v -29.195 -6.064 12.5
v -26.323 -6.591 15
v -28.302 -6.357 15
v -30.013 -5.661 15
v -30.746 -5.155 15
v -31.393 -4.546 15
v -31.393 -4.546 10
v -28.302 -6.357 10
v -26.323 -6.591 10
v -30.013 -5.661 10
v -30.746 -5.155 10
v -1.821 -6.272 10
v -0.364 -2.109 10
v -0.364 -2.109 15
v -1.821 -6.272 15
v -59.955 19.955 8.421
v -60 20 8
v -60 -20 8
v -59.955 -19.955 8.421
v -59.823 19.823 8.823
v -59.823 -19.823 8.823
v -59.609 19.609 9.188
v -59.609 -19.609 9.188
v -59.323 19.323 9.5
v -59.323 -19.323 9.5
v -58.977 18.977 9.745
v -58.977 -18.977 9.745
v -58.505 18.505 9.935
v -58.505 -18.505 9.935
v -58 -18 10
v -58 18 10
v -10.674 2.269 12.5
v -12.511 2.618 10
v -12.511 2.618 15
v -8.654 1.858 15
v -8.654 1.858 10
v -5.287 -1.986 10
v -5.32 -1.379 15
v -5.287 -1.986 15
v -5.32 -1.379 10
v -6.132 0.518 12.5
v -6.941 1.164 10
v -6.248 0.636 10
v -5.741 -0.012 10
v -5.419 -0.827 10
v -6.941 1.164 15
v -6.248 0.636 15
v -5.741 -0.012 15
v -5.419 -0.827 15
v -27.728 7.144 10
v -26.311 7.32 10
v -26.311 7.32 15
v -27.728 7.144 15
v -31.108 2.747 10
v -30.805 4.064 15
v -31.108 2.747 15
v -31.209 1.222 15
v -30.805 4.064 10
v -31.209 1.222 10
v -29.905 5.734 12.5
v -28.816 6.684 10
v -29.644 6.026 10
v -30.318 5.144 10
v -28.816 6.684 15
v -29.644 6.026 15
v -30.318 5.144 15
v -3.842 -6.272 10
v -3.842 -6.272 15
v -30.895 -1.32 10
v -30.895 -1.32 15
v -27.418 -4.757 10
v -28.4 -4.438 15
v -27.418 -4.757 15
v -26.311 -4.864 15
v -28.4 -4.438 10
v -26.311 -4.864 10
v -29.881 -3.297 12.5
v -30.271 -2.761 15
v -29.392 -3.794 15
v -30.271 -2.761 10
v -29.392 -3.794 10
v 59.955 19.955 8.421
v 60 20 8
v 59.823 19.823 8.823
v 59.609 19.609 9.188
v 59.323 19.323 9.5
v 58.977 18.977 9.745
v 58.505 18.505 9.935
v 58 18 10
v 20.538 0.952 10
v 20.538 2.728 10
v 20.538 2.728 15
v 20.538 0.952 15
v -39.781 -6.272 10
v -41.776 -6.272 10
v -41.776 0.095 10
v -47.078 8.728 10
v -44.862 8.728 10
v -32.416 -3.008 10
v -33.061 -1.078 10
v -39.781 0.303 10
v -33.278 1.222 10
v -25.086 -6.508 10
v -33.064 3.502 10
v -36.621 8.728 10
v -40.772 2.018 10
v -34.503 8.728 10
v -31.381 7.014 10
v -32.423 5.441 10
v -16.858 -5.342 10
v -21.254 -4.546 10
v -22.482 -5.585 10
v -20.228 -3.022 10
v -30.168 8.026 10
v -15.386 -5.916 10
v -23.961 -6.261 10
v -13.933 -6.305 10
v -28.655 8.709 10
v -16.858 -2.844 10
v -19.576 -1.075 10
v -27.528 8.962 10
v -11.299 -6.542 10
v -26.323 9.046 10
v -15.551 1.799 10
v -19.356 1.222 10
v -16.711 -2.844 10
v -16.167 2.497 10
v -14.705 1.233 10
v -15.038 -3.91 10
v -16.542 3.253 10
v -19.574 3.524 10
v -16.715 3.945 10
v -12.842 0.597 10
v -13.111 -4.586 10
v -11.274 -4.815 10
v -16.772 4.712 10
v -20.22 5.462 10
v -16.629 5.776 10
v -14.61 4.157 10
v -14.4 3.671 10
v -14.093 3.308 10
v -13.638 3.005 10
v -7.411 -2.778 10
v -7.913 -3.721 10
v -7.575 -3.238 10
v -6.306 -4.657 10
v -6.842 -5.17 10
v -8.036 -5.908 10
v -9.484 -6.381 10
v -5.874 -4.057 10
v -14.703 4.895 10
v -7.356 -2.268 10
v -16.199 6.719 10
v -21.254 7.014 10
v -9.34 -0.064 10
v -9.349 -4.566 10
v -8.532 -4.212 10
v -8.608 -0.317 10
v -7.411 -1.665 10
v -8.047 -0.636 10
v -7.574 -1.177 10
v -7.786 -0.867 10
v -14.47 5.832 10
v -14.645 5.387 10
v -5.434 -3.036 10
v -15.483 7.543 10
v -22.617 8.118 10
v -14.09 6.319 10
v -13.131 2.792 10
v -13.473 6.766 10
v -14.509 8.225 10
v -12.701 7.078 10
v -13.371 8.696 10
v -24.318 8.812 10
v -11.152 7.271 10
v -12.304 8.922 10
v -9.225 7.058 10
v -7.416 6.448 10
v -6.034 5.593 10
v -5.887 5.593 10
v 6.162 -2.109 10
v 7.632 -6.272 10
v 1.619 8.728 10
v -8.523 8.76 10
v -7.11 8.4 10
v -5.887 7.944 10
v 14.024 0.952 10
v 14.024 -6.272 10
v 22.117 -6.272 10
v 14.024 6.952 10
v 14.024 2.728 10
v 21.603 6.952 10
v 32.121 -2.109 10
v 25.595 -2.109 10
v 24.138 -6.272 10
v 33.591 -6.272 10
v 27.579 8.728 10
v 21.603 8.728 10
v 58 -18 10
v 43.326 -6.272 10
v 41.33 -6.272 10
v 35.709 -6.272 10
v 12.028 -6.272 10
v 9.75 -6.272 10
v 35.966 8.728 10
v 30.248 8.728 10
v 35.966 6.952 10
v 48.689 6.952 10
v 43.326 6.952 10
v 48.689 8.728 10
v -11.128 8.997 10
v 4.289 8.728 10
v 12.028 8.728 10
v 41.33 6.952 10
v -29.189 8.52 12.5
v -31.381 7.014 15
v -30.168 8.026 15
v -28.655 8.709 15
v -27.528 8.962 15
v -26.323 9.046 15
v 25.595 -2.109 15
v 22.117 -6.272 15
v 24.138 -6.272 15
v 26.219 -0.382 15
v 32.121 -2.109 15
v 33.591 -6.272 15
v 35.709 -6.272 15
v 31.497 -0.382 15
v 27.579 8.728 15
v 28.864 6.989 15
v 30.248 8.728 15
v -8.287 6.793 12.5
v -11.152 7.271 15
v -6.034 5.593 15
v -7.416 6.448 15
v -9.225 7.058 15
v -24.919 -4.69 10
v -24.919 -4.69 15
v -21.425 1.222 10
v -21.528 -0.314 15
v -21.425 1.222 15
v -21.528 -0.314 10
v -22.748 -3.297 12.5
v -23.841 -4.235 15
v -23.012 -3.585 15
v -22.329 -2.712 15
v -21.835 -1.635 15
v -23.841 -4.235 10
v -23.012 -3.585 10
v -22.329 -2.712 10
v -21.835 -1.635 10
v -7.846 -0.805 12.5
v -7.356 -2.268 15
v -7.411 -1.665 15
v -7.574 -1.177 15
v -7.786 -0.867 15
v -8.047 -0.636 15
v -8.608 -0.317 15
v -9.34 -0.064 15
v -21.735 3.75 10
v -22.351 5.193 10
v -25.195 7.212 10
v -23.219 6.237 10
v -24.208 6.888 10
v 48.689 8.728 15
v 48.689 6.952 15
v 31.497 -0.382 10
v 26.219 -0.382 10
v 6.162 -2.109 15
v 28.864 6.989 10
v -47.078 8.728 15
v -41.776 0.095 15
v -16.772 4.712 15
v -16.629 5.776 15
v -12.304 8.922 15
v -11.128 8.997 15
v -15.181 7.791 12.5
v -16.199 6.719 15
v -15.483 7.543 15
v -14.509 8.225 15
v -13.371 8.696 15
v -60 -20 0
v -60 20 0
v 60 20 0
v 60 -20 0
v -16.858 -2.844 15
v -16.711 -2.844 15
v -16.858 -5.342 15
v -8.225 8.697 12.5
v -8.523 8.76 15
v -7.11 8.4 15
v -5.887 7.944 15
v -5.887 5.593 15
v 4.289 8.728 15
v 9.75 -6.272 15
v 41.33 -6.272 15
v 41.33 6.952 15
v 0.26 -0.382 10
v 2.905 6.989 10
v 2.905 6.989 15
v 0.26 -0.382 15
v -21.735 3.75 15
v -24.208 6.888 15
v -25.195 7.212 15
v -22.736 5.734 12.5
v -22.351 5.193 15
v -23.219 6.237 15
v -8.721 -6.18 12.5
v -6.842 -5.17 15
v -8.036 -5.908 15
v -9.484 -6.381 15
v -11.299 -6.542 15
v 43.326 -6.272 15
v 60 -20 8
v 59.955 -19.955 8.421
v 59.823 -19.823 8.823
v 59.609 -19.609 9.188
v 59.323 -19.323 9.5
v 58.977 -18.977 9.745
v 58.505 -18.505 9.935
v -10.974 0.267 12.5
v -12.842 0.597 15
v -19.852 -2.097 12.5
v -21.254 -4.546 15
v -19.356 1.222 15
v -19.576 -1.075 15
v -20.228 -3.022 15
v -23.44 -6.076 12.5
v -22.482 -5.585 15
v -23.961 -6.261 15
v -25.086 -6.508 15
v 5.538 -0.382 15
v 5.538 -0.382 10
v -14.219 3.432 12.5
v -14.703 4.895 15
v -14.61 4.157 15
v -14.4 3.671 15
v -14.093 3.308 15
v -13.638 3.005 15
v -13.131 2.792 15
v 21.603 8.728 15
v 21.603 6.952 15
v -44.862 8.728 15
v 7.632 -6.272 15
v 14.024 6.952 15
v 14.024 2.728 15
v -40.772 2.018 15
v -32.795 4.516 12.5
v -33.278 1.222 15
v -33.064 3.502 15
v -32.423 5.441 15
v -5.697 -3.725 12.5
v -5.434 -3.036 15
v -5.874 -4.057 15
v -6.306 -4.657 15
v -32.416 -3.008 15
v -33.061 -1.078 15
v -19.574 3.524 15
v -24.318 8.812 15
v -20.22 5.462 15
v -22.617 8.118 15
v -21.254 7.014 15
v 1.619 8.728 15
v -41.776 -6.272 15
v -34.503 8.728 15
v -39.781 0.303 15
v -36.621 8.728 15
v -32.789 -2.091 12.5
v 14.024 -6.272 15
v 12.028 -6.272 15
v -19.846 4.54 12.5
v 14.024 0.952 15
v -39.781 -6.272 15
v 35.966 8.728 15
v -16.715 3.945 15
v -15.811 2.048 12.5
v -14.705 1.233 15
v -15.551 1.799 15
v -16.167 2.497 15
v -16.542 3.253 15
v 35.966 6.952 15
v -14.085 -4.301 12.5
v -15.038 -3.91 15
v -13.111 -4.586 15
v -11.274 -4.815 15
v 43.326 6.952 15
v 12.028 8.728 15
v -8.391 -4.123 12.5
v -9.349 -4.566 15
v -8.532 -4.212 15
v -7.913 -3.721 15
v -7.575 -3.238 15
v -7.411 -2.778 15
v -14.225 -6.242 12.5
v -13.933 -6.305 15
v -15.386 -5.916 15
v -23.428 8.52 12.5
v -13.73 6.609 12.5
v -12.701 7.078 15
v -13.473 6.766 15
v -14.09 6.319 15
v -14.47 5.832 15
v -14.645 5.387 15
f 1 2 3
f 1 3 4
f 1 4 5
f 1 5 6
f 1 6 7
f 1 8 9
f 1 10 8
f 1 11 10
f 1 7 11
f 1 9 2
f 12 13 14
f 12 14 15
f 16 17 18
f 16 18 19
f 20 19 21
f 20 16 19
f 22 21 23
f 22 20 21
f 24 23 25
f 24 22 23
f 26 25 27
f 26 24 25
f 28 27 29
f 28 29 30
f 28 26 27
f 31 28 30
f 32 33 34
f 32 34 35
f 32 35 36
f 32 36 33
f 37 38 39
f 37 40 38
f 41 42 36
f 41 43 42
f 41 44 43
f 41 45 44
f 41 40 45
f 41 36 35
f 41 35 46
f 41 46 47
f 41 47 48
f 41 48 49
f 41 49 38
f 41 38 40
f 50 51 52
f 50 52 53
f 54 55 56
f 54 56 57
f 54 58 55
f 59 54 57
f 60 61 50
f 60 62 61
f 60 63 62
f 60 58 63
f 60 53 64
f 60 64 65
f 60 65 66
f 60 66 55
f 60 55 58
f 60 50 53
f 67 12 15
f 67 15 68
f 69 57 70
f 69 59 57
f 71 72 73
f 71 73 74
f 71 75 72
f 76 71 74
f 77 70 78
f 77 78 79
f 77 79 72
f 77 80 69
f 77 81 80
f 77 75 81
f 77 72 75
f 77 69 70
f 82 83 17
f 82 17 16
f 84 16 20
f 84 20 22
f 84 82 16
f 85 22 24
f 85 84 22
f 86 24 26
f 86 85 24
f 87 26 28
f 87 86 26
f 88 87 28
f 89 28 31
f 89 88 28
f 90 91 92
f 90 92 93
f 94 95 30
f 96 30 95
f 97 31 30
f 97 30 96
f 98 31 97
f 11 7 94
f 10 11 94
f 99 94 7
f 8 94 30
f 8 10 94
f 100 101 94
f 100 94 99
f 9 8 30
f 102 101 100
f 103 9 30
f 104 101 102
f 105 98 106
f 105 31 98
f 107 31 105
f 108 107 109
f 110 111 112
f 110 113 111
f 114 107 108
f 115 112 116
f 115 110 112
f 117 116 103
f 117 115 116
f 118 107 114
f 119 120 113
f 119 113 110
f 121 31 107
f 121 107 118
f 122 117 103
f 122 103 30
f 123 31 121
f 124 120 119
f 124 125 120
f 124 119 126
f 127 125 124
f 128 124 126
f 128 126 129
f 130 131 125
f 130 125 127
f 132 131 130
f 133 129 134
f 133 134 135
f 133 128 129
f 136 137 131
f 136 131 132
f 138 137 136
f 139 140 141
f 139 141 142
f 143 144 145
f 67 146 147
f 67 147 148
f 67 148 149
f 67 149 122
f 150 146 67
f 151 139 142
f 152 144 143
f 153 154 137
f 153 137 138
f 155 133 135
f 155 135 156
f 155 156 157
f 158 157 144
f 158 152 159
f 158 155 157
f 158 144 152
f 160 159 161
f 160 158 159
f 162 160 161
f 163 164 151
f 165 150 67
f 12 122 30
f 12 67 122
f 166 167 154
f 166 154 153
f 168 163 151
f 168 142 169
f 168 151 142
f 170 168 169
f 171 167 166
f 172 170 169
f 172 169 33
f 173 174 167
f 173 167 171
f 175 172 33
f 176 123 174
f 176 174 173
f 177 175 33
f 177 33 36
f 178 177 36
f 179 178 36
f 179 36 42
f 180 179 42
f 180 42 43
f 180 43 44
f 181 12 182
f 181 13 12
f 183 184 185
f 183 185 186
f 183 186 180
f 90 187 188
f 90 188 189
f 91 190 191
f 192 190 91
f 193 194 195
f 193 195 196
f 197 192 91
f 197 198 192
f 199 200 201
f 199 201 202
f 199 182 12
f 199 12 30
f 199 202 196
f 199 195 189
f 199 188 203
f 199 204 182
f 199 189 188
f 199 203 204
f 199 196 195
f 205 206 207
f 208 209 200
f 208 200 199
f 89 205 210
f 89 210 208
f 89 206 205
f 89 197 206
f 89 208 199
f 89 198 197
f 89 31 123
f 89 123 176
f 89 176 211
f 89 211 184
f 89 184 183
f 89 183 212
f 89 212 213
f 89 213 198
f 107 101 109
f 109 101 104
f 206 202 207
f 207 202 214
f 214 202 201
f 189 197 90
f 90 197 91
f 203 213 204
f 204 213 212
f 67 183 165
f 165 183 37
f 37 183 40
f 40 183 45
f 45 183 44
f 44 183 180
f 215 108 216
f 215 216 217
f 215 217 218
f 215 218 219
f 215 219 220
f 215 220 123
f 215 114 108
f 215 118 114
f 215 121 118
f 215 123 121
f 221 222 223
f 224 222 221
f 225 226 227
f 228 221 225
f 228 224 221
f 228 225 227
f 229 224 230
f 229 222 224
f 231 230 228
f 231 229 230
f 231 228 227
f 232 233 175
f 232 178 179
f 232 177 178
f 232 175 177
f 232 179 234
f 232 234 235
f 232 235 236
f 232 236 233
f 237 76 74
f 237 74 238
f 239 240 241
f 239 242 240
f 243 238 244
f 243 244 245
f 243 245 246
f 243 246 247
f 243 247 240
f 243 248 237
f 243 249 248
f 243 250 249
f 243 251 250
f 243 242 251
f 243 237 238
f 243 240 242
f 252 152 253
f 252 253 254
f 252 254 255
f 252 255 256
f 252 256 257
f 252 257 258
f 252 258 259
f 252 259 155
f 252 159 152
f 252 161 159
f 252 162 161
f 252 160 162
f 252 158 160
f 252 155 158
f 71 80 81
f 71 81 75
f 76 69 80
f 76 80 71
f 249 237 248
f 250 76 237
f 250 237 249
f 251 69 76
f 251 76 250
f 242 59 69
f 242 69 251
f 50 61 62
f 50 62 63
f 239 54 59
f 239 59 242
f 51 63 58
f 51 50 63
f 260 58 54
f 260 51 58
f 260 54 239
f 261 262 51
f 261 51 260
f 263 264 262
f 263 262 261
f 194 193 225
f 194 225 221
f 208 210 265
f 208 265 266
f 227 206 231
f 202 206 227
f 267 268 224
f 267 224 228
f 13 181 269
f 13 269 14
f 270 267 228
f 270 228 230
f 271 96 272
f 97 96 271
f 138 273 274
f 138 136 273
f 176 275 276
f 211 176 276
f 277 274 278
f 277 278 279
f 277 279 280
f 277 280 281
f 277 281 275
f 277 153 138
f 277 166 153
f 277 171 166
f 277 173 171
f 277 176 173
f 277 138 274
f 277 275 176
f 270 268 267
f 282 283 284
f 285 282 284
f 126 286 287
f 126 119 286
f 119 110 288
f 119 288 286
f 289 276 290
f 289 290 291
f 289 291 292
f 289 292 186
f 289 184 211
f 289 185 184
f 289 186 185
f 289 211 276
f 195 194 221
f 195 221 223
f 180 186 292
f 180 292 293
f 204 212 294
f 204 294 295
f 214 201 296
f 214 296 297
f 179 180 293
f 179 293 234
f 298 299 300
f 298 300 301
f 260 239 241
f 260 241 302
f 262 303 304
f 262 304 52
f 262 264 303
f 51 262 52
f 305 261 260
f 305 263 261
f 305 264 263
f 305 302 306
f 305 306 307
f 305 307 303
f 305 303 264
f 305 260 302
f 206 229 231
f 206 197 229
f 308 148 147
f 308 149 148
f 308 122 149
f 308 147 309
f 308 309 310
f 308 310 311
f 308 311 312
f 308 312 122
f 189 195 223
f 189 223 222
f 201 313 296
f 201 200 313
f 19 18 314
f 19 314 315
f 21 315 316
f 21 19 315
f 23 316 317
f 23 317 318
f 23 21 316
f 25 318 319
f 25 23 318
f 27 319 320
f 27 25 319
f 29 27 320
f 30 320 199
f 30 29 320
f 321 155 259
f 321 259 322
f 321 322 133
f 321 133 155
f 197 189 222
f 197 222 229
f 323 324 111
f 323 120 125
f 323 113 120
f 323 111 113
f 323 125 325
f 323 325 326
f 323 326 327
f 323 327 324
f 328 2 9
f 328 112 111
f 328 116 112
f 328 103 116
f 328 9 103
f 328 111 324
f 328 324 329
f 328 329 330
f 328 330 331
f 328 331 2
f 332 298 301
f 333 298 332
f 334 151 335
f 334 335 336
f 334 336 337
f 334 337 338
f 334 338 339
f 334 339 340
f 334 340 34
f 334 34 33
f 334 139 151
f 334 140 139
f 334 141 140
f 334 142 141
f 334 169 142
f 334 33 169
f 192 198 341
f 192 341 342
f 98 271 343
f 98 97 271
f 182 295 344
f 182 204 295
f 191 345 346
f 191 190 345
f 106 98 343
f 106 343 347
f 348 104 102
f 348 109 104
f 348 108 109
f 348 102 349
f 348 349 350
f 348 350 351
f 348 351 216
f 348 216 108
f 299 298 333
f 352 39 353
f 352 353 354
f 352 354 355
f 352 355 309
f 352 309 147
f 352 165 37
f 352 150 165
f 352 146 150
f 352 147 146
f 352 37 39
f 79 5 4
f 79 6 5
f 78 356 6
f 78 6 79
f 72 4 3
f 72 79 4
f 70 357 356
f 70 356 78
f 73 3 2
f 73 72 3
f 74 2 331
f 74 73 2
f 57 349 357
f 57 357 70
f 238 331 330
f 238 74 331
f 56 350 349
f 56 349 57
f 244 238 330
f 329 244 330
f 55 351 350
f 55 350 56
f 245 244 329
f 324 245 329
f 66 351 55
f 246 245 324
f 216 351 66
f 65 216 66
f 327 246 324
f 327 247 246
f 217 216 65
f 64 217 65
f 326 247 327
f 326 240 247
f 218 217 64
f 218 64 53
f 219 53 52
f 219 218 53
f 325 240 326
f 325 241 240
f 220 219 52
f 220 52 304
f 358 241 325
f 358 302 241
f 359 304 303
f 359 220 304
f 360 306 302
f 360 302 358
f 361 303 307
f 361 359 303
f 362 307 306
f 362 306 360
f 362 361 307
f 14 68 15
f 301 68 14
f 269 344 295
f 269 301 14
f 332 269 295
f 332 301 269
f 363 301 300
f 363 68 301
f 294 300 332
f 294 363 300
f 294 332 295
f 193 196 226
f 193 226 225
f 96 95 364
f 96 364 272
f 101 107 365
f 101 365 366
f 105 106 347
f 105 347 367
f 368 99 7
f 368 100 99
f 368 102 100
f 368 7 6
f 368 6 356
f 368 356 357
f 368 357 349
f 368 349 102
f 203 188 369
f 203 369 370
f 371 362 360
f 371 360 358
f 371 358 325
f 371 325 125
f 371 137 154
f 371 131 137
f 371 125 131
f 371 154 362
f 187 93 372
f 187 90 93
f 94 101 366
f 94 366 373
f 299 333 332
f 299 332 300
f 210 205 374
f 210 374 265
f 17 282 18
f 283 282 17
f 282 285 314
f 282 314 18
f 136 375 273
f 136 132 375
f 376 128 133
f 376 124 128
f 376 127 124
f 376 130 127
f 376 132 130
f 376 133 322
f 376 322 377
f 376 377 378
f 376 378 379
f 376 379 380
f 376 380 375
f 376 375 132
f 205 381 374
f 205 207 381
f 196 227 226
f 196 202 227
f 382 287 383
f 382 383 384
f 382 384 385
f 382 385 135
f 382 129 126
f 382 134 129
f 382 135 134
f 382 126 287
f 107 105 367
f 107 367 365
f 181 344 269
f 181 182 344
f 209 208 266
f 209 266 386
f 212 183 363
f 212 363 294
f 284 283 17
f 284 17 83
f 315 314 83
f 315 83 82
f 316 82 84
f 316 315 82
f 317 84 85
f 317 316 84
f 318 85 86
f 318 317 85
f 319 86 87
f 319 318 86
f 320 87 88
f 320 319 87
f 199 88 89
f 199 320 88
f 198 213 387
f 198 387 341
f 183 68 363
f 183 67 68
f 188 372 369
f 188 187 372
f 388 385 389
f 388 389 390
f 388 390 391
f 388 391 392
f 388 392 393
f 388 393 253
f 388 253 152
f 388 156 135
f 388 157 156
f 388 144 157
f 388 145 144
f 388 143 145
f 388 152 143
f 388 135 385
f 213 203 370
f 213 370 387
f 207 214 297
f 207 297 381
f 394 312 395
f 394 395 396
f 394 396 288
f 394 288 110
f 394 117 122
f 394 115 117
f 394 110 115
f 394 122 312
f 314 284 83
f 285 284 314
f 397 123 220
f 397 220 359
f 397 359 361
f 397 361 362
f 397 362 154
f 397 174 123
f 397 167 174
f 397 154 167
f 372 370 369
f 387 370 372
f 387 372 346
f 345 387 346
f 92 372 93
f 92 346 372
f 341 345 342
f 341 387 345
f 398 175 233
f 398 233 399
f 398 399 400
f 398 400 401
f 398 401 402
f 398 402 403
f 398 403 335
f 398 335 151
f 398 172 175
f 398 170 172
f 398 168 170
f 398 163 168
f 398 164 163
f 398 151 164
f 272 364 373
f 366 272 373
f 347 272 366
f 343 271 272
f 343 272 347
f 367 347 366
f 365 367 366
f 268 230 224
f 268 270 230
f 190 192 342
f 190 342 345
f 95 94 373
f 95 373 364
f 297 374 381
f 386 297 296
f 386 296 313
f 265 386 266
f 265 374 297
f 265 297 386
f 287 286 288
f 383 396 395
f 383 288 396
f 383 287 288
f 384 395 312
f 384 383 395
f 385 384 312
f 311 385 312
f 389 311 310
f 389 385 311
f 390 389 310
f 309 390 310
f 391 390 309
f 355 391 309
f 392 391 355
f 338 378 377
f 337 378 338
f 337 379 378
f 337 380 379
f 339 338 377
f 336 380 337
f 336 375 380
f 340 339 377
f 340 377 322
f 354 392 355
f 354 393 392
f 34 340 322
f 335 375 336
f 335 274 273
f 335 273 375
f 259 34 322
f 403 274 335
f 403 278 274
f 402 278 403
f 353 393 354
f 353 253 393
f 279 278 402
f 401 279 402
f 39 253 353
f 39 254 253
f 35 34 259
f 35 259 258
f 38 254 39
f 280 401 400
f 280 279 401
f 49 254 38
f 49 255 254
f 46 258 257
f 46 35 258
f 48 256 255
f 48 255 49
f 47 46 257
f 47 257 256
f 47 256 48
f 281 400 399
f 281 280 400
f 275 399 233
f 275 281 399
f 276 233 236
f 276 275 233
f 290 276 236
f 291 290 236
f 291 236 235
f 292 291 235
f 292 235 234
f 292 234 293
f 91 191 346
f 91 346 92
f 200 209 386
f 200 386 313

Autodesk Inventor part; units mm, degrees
ref_plane "YZ Plane" through (0, 0, 0) normal (1, 0, 0) x (0, 1, 0)
ref_plane "XZ Plane" through (0, 0, 0) normal (0, 1, 0) x (-1, 0, 0)
sketch "Boceto1" plane through (0, 0, 0) normal (0, 0, 1) x (1, 0, 0)
  line L0 (0, 0) -> (-60, 0) construction
  line L1 (-60, 0) -> (-60, 20) construction
  line L2 (-60, 20) -> (60, 20)
  line L3 (60, 20) -> (60, -20)
  line L4 (60, -20) -> (-60, -20)
  line L5 (-60, -20) -> (-60, 20)
  dimension "d0" = 60
  dimension "d1" = 20
  dimension "d2" = 120
  dimension "d3" = 40
extrude "Extrusión1" add sketch "Boceto1" along normal blind 10
fillet "Empalme1" radius 2 4 edges at (0, 20, 10) (60, 0, 10) (0, -20, 10) (-60, 0, 10)
ref_plane "Plano de trabajo1" through (0, 0, 10) normal (0, 0, 1) x (1, 0, 0)
sketch "Boceto2" plane through (0, 0, 10) normal (0, 0, 1) x (1, 0, 0)
  line L0 (-47.1397, 9.0462) -> (47.4717, 9.0462) construction
  line L1 (47.4717, 9.0462) -> (47.4717, -9.0462) construction
  line L2 (47.4717, -9.0462) -> (-47.1397, -9.0462) construction
  line L3 (-47.1397, -9.0462) -> (-47.1397, 9.0462) construction
  line L4 (-60, 20) -> (-60, -20) construction
  line L5 (-60, 0) -> (-47.3055, 0) construction
  line L6 (60, -20) -> (60, 20) construction
  line L7 (-34.503, 8.7278) -> (-39.7806, 0.3033)
  line L8 (-39.7806, 0.3033) -> (-39.7806, -6.2722)
  line L9 (-39.7806, -6.2722) -> (-41.7765, -6.2722)
  line L10 (-41.7765, -6.2722) -> (-41.7765, 0.0952)
  line L11 (-41.7765, 0.0952) -> (-47.0785, 8.7278)
  line L12 (-47.0785, 8.7278) -> (-44.8622, 8.7278)
  line L13 (-44.8622, 8.7278) -> (-40.7724, 2.0176)
  line L14 (-40.7724, 2.0176) -> (-36.6214, 8.7278)
  line L15 (-36.6214, 8.7278) -> (-34.503, 8.7278)
  spline S0 degree 2 poles (-21.254, 7.0135) (-20.3357, 5.9972) (-19.3561, 3.0829) (-19.3561, 1.2217) knots 0 0 0 1 2 2 2
  spline S1 degree 2 poles (-19.3561, 1.2217) (-19.3561, -0.6273) (-20.3479, -3.5661) (-21.254, -4.5457) knots 0 0 0 1 2 2 2
  spline S2 degree 2 poles (-21.254, -4.5457) (-22.1724, -5.562) (-24.7071, -6.5906) (-26.3234, -6.5906) knots 0 0 0 1 2 2 2
  spline S3 degree 2 poles (-26.3234, -6.5906) (-27.903, -6.5906) (-30.4867, -5.5375) (-31.3928, -4.5457) knots 0 0 0 1 2 2 2
  spline S4 degree 2 poles (-31.3928, -4.5457) (-32.2989, -3.5416) (-33.2785, -0.6395) (-33.2785, 1.2217) knots 0 0 0 1 2 2 2
  spline S5 degree 2 poles (-33.2785, 1.2217) (-33.2785, 3.0584) (-32.3112, 5.9727) (-31.3806, 7.0135) knots 0 0 0 1 2 2 2
  spline S6 degree 2 poles (-31.3806, 7.0135) (-30.4989, 7.9931) (-27.8785, 9.0462) (-26.3234, 9.0462) knots 0 0 0 1 2 2 2
  spline S7 degree 2 poles (-26.3234, 9.0462) (-24.7071, 9.0462) (-22.1479, 7.9931) (-21.254, 7.0135) knots 0 0 0 1 2 2 2
  spline S8 degree 2 poles (-21.4254, 1.2217) (-21.4254, 4.1482) (-24.0459, 7.3197) (-26.3112, 7.3197) knots 0 0 0 1 2 2 2
  spline S9 degree 2 poles (-26.3112, 7.3197) (-28.601, 7.3197) (-31.2091, 4.1482) (-31.2091, 1.2217) knots 0 0 0 1 2 2 2
  spline S10 degree 2 poles (-31.2091, 1.2217) (-31.2091, -1.7293) (-28.552, -4.864) (-26.3112, -4.864) knots 0 0 0 1 2 2 2
  spline S11 degree 2 poles (-26.3112, -4.864) (-24.0703, -4.864) (-21.4254, -1.7293) (-21.4254, 1.2217) knots 0 0 0 1 2 2 2
  spline S12 degree 2 poles (-5.2867, -1.9865) (-5.2867, -2.8681) (-6.1071, -4.5824) (-6.8418, -5.1701) knots 0 0 0 1 2 2 2
  spline S13 degree 2 poles (-6.8418, -5.1701) (-7.6499, -5.8191) (-9.7928, -6.5416) (-11.2989, -6.5416) knots 0 0 0 1 2 2 2
  spline S14 degree 2 poles (-11.2989, -6.5416) (-12.9275, -6.5416) (-15.5234, -5.9416) (-16.8581, -5.3416) knots 0 0 0 1 2 2 2
  line L16 (-16.8581, -5.3416) -> (-16.8581, -2.8436)
  line L17 (-16.8581, -2.8436) -> (-16.7112, -2.8436)
  spline S15 degree 2 poles (-16.7112, -2.8436) (-15.5724, -3.7865) (-12.5969, -4.815) (-11.2744, -4.815) knots 0 0 0 1 2 2 2
  spline S16 degree 2 poles (-11.2744, -4.815) (-9.4254, -4.815) (-7.3561, -3.4314) (-7.3561, -2.2681) knots 0 0 0 1 2 2 2
  spline S17 degree 2 poles (-7.3561, -2.2681) (-7.3561, -1.2763) (-8.3357, -0.3334) (-9.3397, -0.064) knots 0 0 0 1 2 2 2
  spline S18 degree 2 poles (-9.3397, -0.064) (-10.0867, 0.1319) (-11.8622, 0.4013) (-12.8418, 0.5972) knots 0 0 0 1 2 2 2
  spline S19 degree 2 poles (-12.8418, 0.5972) (-14.8499, 1.0258) (-16.7724, 3.0707) (-16.7724, 4.7115) knots 0 0 0 1 2 2 2
  spline S20 degree 2 poles (-16.7724, 4.7115) (-16.7724, 6.585) (-13.5887, 8.9972) (-11.1275, 8.9972) knots 0 0 0 1 2 2 2
  spline S21 degree 2 poles (-11.1275, 8.9972) (-9.5479, 8.9972) (-6.903, 8.3972) (-5.8867, 7.9441) knots 0 0 0 1 2 2 2
  line L18 (-5.8867, 7.9441) -> (-5.8867, 5.5931)
  line L19 (-5.8867, 5.5931) -> (-6.0336, 5.5931)
  spline S22 degree 2 poles (-6.0336, 5.5931) (-6.8908, 6.3156) (-9.6826, 7.2707) (-11.152, 7.2707) knots 0 0 0 1 2 2 2
  spline S23 degree 2 poles (-11.152, 7.2707) (-12.7561, 7.2707) (-14.703, 5.9482) (-14.703, 4.8952) knots 0 0 0 1 2 2 2
  spline S24 degree 2 poles (-14.703, 4.8952) (-14.703, 3.9645) (-13.7357, 2.8992) (-12.5112, 2.6176) knots 0 0 0 1 2 2 2
  spline S25 degree 2 poles (-12.5112, 2.6176) (-11.8622, 2.4707) (-9.4867, 2.0666) (-8.654, 1.8584) knots 0 0 0 1 2 2 2
  spline S26 degree 2 poles (-8.654, 1.8584) (-6.9765, 1.4176) (-5.2867, -0.3824) (-5.2867, -1.9865) knots 0 0 0 1 2 2 2
  line L20 (9.7501, -6.2722) -> (7.6317, -6.2722)
  line L21 (7.6317, -6.2722) -> (6.1623, -2.1089)
  line L22 (6.1623, -2.1089) -> (-0.3642, -2.1089)
  line L23 (-0.3642, -2.1089) -> (-1.8214, -6.2722)
  line L24 (-1.8214, -6.2722) -> (-3.8418, -6.2722)
  line L25 (-3.8418, -6.2722) -> (1.6194, 8.7278)
  line L26 (1.6194, 8.7278) -> (4.2888, 8.7278)
  line L27 (4.2888, 8.7278) -> (9.7501, -6.2722)
  line L28 (5.5378, -0.3824) -> (2.9052, 6.989)
  line L29 (2.9052, 6.989) -> (0.2603, -0.3824)
  line L30 (0.2603, -0.3824) -> (5.5378, -0.3824)
  line L31 (21.6031, 6.9523) -> (14.0235, 6.9523)
  line L32 (14.0235, 6.9523) -> (14.0235, 2.7278)
  line L33 (14.0235, 2.7278) -> (20.5378, 2.7278)
  line L34 (20.5378, 2.7278) -> (20.5378, 0.9523)
  line L35 (20.5378, 0.9523) -> (14.0235, 0.9523)
  line L36 (14.0235, 0.9523) -> (14.0235, -6.2722)
  line L37 (14.0235, -6.2722) -> (12.0276, -6.2722)
  line L38 (12.0276, -6.2722) -> (12.0276, 8.7278)
  line L39 (12.0276, 8.7278) -> (21.6031, 8.7278)
  line L40 (21.6031, 8.7278) -> (21.6031, 6.9523)
  line L41 (35.7092, -6.2722) -> (33.5909, -6.2722)
  line L42 (33.5909, -6.2722) -> (32.1215, -2.1089)
  line L43 (32.1215, -2.1089) -> (25.595, -2.1089)
  line L44 (25.595, -2.1089) -> (24.1378, -6.2722)
  line L45 (24.1378, -6.2722) -> (22.1174, -6.2722)
  line L46 (22.1174, -6.2722) -> (27.5786, 8.7278)
  line L47 (27.5786, 8.7278) -> (30.248, 8.7278)
  line L48 (30.248, 8.7278) -> (35.7092, -6.2722)
  line L49 (31.497, -0.3824) -> (28.8643, 6.989)
  line L50 (28.8643, 6.989) -> (26.2194, -0.3824)
  line L51 (26.2194, -0.3824) -> (31.497, -0.3824)
  line L52 (48.6888, 6.9523) -> (43.3256, 6.9523)
  line L53 (43.3256, 6.9523) -> (43.3256, -6.2722)
  line L54 (43.3256, -6.2722) -> (41.3297, -6.2722)
  line L55 (41.3297, -6.2722) -> (41.3297, 6.9523)
  line L56 (41.3297, 6.9523) -> (35.9664, 6.9523)
  line L57 (35.9664, 6.9523) -> (35.9664, 8.7278)
  line L58 (35.9664, 8.7278) -> (48.6888, 8.7278)
  line L59 (48.6888, 8.7278) -> (48.6888, 6.9523)
  point P0 (0, 0)
  dimension "d8" = 94.6114
  dimension "d9" = 12.6945
  dimension "d10" = 12.5283
extrude "Extrusión2" add sketch "Boceto2" along normal blind 5
properties part number "Repujado 1"
